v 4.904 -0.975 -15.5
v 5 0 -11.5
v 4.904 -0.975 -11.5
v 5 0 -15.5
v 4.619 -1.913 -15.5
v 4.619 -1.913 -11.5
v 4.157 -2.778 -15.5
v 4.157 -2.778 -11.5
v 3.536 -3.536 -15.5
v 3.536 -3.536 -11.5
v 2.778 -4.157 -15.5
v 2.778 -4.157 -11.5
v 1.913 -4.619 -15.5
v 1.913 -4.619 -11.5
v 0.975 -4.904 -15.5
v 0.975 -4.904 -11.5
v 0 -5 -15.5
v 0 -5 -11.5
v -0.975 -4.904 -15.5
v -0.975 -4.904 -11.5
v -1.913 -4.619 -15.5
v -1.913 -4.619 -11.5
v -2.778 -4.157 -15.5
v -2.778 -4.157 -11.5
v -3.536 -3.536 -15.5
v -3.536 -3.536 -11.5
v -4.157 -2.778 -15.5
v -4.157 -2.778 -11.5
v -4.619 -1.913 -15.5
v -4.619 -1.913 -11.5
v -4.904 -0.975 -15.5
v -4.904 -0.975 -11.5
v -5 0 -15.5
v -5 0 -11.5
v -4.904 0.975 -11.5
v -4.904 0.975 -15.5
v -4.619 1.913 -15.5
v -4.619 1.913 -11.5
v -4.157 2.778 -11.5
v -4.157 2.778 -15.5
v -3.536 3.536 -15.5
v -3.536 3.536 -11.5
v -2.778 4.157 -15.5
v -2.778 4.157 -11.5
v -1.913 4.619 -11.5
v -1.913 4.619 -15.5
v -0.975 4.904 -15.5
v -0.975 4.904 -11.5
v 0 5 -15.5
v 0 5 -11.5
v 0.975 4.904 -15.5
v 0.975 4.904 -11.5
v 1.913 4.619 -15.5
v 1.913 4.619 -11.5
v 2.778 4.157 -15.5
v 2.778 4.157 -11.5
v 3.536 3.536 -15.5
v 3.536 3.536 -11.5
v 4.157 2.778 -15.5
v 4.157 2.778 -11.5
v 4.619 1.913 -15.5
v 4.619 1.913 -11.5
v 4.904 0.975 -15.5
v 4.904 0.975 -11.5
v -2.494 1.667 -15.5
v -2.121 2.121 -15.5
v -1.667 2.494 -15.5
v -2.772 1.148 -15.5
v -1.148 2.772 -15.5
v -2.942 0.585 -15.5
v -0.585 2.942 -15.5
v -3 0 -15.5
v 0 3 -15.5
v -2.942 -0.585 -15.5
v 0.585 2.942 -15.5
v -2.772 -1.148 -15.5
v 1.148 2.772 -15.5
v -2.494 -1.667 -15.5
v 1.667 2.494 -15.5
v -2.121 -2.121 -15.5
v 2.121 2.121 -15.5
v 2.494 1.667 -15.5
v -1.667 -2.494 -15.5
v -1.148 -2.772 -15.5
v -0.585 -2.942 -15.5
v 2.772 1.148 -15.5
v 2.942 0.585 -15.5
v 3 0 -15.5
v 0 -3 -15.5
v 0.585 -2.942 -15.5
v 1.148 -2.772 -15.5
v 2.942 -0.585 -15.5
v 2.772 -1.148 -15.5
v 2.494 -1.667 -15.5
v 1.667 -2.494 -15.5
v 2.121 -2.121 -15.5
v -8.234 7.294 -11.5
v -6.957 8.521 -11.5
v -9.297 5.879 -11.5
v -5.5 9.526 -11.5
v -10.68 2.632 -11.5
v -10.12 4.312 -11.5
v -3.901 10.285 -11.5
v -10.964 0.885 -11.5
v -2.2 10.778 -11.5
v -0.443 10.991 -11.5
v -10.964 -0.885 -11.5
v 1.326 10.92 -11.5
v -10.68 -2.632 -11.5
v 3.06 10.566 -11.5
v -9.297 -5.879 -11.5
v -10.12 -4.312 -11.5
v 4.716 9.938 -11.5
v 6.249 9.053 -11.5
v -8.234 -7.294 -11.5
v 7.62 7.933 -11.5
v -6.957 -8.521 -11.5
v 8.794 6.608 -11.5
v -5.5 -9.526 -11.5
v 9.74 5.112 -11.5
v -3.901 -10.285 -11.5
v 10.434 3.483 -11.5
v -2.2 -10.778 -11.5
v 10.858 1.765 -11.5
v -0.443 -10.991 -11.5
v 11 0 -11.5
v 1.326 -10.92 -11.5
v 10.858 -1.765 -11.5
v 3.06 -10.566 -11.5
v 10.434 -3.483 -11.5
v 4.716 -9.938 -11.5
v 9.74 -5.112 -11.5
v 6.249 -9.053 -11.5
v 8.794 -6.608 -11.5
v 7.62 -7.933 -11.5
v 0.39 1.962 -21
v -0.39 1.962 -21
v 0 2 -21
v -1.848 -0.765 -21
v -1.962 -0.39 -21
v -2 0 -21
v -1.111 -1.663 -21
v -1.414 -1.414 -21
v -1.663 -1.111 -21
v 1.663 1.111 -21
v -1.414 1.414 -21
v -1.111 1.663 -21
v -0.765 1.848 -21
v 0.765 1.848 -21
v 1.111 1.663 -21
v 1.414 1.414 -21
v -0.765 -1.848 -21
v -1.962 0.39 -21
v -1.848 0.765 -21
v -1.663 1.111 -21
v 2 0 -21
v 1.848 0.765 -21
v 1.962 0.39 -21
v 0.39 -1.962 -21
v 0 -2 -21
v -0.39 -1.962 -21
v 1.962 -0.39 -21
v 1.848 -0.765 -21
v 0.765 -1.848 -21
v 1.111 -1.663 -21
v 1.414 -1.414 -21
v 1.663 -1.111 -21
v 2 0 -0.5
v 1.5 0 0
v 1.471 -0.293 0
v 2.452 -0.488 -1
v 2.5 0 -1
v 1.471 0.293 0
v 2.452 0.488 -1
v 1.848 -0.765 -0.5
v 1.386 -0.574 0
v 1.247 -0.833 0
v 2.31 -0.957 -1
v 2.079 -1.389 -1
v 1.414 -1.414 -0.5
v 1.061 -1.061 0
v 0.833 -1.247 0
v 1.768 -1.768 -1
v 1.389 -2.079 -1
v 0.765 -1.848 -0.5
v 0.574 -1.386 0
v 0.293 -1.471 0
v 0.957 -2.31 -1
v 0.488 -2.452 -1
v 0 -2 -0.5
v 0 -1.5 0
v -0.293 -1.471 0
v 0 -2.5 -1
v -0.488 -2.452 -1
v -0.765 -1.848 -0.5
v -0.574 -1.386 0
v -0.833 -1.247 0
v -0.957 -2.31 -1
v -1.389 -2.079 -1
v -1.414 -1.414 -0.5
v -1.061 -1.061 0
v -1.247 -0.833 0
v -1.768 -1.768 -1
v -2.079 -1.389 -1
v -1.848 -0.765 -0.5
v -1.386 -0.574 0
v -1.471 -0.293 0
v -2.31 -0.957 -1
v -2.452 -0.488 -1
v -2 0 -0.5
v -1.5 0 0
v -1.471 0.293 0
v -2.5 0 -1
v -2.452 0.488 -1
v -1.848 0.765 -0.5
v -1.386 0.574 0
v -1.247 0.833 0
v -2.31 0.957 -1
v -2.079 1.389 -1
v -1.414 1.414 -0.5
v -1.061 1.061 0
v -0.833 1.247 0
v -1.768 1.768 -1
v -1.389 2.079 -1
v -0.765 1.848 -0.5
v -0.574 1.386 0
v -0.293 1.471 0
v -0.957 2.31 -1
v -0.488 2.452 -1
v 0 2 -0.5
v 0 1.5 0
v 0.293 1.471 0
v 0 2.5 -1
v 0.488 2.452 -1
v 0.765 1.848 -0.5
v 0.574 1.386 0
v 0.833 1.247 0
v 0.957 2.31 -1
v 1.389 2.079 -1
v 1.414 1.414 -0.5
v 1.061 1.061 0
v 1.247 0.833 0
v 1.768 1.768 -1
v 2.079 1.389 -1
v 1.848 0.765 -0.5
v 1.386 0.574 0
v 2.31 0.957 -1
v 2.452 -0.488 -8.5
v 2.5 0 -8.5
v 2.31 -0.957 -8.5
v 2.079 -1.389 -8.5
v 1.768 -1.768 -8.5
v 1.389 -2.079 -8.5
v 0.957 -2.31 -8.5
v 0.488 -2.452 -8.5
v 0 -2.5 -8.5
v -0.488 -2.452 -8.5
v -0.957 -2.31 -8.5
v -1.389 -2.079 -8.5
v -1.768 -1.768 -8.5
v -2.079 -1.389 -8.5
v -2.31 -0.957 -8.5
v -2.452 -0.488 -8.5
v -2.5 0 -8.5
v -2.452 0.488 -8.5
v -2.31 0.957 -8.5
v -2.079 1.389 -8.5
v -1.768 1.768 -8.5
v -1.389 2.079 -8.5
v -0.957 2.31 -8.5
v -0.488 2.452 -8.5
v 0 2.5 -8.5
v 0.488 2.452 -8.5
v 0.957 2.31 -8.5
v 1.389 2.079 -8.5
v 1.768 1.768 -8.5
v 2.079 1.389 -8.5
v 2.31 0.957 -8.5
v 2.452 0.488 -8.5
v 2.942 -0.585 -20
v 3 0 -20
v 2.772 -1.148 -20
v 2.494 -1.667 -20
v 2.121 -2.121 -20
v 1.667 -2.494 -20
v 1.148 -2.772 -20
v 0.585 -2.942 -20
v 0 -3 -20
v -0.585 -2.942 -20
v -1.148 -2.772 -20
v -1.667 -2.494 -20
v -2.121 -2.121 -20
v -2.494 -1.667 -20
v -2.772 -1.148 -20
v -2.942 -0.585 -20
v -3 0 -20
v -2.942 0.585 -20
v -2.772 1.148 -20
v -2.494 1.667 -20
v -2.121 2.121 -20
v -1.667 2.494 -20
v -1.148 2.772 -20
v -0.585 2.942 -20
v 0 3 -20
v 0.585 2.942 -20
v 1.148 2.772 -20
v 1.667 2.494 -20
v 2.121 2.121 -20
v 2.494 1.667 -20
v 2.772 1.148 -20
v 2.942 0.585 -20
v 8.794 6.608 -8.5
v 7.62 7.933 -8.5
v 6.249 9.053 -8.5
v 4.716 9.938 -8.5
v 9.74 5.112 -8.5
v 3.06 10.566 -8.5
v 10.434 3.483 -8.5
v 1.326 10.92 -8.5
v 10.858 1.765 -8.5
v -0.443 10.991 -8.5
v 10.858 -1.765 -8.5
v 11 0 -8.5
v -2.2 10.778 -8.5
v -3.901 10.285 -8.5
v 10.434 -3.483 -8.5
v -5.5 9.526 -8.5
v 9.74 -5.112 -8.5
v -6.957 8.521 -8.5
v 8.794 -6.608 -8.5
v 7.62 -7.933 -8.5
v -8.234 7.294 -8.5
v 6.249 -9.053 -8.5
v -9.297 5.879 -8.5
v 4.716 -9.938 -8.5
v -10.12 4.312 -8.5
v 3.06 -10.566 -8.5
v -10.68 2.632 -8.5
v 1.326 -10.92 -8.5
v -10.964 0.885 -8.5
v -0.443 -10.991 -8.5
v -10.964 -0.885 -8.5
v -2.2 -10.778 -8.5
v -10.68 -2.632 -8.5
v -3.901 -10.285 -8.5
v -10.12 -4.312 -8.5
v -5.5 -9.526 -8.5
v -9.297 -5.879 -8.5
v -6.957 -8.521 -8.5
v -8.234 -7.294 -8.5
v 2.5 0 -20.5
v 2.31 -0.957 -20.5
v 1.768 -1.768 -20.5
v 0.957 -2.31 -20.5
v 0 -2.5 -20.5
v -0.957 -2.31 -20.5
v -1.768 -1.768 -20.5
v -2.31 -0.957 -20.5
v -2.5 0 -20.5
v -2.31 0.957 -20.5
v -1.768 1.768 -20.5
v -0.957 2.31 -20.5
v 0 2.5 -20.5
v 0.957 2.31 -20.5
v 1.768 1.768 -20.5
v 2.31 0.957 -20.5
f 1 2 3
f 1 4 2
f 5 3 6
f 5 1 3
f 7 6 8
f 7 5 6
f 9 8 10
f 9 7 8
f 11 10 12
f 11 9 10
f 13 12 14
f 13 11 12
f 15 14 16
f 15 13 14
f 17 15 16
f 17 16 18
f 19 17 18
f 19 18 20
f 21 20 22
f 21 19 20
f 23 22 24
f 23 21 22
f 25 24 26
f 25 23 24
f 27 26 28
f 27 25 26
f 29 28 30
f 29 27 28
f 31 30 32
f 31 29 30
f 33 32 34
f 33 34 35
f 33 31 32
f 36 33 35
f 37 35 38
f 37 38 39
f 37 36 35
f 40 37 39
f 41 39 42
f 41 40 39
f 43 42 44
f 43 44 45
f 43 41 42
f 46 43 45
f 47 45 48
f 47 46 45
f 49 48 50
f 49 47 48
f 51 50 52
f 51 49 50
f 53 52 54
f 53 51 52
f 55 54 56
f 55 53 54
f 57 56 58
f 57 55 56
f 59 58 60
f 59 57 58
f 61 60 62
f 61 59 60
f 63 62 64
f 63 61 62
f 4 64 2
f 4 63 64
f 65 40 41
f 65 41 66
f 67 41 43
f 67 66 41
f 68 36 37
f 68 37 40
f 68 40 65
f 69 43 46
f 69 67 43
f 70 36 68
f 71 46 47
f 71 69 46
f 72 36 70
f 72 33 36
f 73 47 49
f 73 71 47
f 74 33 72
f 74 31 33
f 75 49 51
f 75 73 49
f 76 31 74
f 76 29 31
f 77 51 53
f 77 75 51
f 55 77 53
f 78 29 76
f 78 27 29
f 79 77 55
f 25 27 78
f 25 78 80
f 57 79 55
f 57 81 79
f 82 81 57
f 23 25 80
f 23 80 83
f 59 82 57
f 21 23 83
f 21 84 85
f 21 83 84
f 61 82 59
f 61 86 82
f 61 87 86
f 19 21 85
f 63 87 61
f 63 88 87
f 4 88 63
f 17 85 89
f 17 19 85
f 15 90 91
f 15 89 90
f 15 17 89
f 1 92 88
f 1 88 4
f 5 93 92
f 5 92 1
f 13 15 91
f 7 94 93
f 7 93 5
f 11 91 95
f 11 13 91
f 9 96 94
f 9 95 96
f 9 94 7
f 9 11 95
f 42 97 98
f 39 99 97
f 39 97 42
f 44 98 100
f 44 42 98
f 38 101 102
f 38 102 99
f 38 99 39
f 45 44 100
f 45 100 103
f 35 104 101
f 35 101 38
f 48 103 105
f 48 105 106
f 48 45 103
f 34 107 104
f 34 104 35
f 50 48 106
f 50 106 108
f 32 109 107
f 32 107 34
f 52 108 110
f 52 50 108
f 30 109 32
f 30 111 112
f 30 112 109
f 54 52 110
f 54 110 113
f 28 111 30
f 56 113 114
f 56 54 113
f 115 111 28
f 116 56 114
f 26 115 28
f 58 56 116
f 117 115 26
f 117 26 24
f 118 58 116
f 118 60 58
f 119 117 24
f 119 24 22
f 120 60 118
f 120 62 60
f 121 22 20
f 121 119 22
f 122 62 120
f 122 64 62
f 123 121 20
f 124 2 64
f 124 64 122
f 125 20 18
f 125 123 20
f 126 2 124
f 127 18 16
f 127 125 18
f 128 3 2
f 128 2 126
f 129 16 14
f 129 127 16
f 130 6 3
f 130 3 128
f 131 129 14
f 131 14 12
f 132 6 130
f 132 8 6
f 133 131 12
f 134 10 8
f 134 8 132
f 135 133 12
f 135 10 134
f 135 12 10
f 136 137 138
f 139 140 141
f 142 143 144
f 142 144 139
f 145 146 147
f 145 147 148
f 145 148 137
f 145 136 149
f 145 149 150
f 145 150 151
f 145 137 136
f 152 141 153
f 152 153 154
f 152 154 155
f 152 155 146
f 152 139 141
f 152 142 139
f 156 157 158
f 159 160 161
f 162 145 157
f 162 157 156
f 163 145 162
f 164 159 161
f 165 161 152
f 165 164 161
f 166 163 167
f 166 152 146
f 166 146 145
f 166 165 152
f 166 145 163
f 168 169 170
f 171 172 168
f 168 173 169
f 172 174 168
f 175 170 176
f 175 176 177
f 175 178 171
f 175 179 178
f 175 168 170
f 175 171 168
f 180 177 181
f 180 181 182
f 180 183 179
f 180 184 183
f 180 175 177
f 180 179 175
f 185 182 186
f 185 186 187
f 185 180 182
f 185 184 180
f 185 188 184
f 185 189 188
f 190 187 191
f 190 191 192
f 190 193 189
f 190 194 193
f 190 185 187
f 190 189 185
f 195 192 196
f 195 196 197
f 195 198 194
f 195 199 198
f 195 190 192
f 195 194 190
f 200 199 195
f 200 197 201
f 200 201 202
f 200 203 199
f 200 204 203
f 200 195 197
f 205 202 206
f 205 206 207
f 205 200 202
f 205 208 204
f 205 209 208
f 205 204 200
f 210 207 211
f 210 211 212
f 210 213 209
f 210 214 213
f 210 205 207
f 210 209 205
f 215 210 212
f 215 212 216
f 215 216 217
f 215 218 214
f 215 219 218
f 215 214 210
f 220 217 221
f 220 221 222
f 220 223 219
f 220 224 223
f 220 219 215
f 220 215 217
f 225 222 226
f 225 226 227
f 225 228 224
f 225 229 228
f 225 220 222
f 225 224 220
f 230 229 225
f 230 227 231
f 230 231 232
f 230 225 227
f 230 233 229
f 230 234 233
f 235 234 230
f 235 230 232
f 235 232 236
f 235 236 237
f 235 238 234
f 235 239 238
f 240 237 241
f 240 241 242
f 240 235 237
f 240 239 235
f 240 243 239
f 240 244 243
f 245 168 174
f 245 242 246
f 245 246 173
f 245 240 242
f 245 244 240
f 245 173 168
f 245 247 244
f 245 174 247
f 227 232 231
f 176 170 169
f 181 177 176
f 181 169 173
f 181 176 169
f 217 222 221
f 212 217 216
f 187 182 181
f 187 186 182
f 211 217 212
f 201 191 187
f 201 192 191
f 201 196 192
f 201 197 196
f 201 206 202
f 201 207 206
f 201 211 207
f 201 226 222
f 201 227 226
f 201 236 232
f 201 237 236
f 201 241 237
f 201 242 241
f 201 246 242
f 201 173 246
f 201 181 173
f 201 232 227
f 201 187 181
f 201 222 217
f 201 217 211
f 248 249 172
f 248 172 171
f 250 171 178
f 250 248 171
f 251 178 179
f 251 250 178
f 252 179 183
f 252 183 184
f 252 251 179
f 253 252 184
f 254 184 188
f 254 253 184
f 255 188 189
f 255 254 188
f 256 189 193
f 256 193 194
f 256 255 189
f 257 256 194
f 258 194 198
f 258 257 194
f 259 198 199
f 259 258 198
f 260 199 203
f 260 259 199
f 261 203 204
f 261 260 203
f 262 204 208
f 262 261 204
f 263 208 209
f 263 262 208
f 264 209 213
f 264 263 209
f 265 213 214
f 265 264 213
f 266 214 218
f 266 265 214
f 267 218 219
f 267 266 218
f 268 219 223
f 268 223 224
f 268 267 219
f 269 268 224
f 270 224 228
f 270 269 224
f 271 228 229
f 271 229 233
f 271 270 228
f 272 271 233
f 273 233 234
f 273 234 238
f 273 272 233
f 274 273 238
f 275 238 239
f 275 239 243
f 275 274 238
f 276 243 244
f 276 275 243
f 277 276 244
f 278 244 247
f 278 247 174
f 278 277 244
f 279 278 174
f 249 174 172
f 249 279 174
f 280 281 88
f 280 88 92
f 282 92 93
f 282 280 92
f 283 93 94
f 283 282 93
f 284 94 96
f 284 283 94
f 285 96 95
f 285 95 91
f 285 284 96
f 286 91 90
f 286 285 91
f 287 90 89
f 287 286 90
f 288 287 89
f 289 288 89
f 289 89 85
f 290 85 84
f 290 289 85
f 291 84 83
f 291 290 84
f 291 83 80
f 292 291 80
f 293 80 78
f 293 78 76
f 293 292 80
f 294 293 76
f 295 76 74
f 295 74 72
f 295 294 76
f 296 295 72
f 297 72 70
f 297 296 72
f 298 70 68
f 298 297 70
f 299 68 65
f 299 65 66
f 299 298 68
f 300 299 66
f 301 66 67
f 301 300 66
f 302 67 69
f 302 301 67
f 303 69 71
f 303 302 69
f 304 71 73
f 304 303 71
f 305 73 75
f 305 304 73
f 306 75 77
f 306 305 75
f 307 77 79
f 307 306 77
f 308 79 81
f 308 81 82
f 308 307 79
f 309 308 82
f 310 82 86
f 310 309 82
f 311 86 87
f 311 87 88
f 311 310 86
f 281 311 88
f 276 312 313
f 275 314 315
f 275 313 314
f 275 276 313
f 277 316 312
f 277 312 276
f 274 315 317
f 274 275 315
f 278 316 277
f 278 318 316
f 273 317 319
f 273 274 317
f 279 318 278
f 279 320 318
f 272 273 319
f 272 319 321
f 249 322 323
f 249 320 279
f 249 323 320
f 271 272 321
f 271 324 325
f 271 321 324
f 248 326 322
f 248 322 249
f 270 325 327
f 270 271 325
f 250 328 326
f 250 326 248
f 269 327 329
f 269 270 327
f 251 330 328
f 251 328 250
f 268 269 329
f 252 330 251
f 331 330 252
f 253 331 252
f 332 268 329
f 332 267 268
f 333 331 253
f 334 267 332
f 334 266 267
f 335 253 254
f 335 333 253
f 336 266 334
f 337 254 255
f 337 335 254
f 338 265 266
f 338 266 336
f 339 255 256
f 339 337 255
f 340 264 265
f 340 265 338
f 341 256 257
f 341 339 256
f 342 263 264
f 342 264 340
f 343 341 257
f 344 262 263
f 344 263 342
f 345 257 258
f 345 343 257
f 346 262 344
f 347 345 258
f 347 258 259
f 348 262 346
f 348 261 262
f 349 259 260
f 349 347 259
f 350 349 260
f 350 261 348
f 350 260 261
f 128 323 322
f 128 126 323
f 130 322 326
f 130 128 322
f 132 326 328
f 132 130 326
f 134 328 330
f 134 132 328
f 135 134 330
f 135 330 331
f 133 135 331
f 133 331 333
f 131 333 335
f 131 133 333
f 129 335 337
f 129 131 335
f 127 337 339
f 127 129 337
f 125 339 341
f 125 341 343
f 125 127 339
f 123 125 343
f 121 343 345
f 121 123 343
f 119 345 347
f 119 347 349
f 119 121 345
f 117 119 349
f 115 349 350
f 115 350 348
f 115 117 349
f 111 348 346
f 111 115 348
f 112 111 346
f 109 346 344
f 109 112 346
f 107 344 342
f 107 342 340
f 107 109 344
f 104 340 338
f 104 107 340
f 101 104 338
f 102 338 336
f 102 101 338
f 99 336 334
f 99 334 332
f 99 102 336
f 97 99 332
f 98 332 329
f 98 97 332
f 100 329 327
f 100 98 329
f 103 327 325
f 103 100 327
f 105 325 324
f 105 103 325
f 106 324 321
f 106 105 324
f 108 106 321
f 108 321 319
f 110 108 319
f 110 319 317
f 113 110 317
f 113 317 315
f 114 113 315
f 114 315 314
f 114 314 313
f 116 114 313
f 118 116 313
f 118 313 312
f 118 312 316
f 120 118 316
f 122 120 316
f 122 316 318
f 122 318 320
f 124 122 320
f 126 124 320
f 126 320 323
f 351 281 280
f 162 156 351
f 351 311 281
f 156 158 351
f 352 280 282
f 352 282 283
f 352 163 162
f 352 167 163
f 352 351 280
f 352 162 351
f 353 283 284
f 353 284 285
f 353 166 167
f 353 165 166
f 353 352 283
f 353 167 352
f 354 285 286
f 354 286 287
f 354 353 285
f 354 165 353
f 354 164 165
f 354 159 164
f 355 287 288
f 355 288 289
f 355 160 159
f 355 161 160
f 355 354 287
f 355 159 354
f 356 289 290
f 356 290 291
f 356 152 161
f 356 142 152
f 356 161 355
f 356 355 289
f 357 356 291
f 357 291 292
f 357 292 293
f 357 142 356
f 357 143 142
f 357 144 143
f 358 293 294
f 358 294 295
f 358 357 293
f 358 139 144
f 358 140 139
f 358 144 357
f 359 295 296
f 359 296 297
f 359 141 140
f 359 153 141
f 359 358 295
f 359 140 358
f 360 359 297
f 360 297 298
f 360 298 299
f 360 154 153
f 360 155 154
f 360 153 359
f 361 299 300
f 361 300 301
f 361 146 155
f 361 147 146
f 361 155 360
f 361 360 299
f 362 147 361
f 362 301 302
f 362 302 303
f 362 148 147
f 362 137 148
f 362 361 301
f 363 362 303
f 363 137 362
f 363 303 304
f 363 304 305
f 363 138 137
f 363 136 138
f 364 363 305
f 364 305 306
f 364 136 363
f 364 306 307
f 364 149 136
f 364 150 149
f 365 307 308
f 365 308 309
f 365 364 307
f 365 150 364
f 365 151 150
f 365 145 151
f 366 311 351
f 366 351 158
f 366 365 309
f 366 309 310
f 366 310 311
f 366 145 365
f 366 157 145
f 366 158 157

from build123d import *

# Parameters (mm, degrees)
CHAMFER1_SIZE = 1


with BuildPart() as part:
    # Sketch1 → Revolve1 (revolve)
    with BuildSketch(Plane(origin=(0, 0, 0), x_dir=(0, 0, -1), z_dir=(1, 0, 0)), mode=Mode.PRIVATE) as revolve1_sk:
        Polygon((0, 0), (0, 2.5), (8.5, 2.5), (8.5, 11), (11.5, 11), (11.5, 5), (15.5, 5), (15.5, 3), (21, 3), (21, 0), align=None)
    revolve(revolve1_sk.sketch.rotate(Axis((0, 0, 41.619499546), (0, 0, -1)), 90), axis=Axis((0, 0, 41.619499546), (0, 0, -1)))

    # Chamfer1
    chamfer1_edges = [part.edges().sort_by_distance(p)[0] for p in [
        (-2.5, 0, 0),
        (-3, 0, -21),
    ]]
    chamfer(chamfer1_edges, length=CHAMFER1_SIZE)


solid = part.part
